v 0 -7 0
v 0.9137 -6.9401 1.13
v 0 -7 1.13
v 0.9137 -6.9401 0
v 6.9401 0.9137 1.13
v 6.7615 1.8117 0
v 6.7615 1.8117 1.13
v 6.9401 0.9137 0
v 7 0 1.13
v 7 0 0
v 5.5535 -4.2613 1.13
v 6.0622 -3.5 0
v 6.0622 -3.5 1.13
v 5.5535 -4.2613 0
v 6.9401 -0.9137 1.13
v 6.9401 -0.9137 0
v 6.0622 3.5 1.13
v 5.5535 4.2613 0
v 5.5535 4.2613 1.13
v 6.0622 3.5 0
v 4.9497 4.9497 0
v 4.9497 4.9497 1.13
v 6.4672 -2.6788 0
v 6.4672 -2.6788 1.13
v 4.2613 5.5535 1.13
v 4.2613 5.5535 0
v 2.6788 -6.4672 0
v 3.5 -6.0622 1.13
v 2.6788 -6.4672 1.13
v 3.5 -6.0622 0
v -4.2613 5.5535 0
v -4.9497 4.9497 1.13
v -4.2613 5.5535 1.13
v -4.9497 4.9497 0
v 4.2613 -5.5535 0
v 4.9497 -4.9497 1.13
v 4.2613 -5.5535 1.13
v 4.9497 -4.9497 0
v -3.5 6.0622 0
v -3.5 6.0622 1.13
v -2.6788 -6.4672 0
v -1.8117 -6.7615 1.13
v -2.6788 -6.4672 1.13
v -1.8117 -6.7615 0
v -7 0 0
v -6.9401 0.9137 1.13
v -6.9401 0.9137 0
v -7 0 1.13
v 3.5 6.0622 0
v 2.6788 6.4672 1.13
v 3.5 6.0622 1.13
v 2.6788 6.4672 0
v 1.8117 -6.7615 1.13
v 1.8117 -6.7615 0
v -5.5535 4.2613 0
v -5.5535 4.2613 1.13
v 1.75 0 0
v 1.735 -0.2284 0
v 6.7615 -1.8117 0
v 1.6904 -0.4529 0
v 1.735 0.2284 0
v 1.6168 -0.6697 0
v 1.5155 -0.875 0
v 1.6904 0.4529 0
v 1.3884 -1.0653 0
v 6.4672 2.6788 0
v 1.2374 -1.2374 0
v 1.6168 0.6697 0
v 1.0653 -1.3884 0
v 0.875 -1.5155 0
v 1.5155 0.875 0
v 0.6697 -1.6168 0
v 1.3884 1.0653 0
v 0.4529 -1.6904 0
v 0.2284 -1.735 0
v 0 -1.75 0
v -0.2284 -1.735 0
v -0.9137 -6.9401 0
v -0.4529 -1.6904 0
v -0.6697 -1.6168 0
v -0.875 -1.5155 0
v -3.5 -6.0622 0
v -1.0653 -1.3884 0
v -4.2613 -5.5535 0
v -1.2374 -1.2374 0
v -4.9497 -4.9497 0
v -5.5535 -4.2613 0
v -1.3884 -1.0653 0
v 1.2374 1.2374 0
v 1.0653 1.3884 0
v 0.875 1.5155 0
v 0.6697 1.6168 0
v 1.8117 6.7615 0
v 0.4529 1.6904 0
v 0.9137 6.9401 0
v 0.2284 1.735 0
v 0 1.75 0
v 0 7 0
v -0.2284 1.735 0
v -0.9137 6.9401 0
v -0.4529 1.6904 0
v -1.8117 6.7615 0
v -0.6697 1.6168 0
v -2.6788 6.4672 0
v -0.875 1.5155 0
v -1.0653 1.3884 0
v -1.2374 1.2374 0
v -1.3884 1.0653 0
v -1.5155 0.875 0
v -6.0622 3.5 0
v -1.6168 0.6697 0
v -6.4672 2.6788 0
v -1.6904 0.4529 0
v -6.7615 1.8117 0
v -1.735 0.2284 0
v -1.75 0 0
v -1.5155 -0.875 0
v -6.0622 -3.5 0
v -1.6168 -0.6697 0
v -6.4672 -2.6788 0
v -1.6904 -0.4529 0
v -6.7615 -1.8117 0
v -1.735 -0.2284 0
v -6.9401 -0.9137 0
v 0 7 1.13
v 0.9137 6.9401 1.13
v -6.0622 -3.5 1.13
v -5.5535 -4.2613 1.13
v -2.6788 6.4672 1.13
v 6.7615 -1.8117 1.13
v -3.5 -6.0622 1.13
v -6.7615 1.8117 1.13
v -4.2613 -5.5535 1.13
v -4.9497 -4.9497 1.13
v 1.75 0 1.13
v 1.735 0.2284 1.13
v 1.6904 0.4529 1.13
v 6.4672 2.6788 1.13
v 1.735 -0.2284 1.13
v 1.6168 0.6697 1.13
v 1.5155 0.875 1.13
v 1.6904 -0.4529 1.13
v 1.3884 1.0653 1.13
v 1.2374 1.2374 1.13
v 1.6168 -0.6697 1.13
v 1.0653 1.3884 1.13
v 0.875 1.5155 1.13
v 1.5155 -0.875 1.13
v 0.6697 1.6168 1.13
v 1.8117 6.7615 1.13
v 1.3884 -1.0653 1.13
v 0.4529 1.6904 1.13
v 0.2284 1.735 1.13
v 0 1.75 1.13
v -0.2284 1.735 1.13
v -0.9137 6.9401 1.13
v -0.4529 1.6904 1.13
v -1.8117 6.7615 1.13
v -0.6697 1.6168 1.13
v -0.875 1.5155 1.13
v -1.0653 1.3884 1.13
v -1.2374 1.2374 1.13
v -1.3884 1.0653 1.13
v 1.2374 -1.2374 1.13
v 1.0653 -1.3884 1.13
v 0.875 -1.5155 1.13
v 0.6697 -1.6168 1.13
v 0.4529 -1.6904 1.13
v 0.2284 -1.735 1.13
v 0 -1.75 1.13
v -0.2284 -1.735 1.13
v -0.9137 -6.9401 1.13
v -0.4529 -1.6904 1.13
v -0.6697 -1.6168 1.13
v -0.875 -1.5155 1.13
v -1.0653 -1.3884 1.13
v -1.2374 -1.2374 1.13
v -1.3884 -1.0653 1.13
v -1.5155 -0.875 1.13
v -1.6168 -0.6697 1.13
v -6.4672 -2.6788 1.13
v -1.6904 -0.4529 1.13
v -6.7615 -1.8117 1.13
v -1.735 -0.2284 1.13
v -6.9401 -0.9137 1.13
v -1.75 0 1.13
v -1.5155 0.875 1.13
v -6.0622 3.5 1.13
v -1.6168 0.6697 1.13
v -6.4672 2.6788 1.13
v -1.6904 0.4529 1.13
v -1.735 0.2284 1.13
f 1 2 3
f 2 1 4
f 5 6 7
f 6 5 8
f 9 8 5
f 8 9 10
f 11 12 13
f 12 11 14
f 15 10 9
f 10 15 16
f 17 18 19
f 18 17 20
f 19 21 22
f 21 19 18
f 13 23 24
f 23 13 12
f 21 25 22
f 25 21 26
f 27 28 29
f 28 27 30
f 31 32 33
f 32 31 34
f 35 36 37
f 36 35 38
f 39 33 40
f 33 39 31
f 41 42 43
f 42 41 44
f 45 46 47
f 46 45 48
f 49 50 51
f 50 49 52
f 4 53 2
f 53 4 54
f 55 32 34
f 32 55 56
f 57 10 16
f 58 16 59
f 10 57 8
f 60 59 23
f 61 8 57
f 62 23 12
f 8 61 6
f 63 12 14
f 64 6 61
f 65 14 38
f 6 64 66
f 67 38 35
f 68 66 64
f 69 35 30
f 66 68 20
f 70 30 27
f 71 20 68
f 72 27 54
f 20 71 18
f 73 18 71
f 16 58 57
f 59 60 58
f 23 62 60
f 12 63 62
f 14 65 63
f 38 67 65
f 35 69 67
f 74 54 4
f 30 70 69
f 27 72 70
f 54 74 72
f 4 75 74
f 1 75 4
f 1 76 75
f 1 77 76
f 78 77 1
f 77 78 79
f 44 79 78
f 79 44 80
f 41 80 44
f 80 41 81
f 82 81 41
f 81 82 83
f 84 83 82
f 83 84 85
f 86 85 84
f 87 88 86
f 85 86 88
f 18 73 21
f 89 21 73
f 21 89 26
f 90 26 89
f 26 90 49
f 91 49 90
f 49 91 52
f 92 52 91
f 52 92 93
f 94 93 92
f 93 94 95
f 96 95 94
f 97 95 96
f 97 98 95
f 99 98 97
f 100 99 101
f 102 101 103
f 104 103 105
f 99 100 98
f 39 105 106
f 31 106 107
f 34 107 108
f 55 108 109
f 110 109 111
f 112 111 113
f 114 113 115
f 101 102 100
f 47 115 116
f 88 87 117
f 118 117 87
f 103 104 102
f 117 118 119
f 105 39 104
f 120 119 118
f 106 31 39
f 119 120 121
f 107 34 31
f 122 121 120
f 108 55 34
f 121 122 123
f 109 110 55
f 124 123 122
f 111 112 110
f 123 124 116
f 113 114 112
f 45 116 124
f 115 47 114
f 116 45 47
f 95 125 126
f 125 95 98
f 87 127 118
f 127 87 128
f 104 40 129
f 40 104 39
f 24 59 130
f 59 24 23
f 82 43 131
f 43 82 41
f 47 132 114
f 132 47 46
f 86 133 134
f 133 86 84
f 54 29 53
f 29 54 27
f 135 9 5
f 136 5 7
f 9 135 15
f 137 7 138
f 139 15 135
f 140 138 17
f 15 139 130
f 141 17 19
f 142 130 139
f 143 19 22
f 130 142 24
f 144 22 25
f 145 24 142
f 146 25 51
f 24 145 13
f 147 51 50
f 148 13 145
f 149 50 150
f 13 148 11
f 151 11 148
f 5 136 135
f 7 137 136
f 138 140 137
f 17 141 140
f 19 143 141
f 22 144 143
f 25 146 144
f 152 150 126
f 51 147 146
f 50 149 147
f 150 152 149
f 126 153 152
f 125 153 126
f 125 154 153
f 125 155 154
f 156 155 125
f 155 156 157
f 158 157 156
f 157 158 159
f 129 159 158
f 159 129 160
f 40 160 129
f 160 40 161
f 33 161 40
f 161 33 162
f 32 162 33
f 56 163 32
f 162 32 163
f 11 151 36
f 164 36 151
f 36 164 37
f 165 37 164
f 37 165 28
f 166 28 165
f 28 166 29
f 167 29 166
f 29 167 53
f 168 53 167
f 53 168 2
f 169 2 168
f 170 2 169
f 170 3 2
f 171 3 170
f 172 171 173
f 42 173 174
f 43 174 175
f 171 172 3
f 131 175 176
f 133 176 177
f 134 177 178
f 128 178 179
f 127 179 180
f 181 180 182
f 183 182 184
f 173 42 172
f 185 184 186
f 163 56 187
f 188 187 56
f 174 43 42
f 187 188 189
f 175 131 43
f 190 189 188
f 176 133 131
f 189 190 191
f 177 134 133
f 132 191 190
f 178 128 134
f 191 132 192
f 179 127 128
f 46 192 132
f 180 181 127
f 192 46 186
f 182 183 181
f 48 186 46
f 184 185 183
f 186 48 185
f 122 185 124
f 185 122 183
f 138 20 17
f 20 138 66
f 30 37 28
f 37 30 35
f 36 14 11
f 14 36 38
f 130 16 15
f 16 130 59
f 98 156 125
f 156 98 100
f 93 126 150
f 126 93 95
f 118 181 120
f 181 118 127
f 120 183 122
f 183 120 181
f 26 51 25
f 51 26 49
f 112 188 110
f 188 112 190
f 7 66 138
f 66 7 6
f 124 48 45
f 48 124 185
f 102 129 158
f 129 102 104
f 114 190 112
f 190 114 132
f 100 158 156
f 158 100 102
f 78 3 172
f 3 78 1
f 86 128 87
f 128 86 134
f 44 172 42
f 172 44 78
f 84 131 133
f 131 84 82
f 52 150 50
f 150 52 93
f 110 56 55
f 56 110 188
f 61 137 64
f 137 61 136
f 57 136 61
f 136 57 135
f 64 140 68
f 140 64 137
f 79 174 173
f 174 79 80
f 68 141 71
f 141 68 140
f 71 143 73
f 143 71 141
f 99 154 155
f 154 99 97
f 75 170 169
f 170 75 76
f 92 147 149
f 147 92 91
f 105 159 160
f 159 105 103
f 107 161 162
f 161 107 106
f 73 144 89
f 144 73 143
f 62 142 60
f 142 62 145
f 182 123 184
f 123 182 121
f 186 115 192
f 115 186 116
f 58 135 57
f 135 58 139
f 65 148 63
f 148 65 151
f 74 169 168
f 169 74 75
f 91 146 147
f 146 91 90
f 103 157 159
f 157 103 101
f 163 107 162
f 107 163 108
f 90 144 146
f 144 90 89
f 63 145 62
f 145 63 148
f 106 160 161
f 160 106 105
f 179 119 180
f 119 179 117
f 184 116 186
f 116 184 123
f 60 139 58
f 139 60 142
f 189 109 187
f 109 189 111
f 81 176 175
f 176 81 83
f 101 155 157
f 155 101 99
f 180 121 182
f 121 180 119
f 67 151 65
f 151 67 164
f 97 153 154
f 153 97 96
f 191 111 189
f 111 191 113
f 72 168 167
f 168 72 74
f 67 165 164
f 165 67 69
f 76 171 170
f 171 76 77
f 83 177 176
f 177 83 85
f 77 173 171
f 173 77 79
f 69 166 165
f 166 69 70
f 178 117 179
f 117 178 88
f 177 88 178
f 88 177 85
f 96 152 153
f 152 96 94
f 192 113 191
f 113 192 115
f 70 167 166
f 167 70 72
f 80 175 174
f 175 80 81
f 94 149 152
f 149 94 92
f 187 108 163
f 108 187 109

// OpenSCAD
// file: parameters.scad
// =============================================================================
// Gen-AJ Vernier flux-claw ultra — WOUND-AWARE (HARD GATE)
// Dual-rotor vernier: Rotor B +22.5° vs 12-slot stator; Ø5 flux claws
// =============================================================================

wire_awg            = 26;
wire_od             = 0.45;
turns               = 175;
fill                = 0.70;
layers_per_face     = 2;
wind_build_axial    = layers_per_face * wire_od * fill;   // 0.63 mm
wind_build_radial   = 3 * wire_od * fill;                 // 0.945 mm

coil_id_r           = 17.0;
coil_od_r           = 64.0;
span_deg            = 25.0;
former_web          = 1.50;
flange_t            = 0.60;
wall                = 1.2;
slot_w              = 2.4;
mount_hole          = 3.5;
tab_len             = 7.0;

former_bare_h       = former_web + 2 * flange_t;            // 2.70 mm
coil_envelope_h     = former_bare_h + 2 * wind_build_axial; // 3.96 mm

run_clear           = 0.50;
gap_spacer_h        = run_clear + wind_build_axial;         // 1.13 mm
m2m                 = coil_envelope_h + 2 * run_clear;      // 4.96 mm

coil_stations       = 12;
bay_r_in            = coil_id_r - 2.0 - wind_build_radial;
bay_r_out           = coil_od_r + 2.0 + wind_build_radial;
bay_span            = span_deg + 4.0;
bay_offset          = 2.0;
stator_thick        = former_bare_h;
stator_od           = 160.0;
shaft_clear_stator  = 34.0;
coil_mount_r        = 26.0;

large_pocket_d      = 20.3;
small_pocket_d      = 5.3;
pocket_h            = 5.2;
large_n             = 8;
R_large             = 42.0;
R_small_inner       = 27.0;
R_small_mid         = 42.0;
R_small_outer       = 57.0;
carrier_od          = 156.0;
carrier_thick       = 7.5;
hub_h               = 10.0;
hub_od              = 30.0;
rotor_b_offset_deg  = 22.5;     // vernier offset vs 12-slot stator

shaft_bore          = 8.35;
bearing_d           = 21.85;
bearing_h           = 7.2;
m3_clear            = 3.5;
bolt_r_inner        = 36.0;
bolt_n_inner        = 6;
flange_bolt_r       = 72.0;
flange_bolt_n       = 6;
brace_r             = 68.0;
brace_d             = 4.3;
brace_n             = 4;

spacer_pad_od       = 14.0;
spacer_pad_id       = m3_clear;
endbell_od          = 160.0;
endbell_thick       = 8.0;
endbell_shaft_clear = 10.0;

$fn = 64;
// main file
// Gen-AJ gap spacer — h = run_clear + wind_build_axial
include <parameters.scad>;
$fn = 48;
difference() {
    cylinder(d=spacer_pad_od, h=gap_spacer_h);
    translate([0, 0, -0.1]) cylinder(d=spacer_pad_id, h=gap_spacer_h + 0.2);
}
